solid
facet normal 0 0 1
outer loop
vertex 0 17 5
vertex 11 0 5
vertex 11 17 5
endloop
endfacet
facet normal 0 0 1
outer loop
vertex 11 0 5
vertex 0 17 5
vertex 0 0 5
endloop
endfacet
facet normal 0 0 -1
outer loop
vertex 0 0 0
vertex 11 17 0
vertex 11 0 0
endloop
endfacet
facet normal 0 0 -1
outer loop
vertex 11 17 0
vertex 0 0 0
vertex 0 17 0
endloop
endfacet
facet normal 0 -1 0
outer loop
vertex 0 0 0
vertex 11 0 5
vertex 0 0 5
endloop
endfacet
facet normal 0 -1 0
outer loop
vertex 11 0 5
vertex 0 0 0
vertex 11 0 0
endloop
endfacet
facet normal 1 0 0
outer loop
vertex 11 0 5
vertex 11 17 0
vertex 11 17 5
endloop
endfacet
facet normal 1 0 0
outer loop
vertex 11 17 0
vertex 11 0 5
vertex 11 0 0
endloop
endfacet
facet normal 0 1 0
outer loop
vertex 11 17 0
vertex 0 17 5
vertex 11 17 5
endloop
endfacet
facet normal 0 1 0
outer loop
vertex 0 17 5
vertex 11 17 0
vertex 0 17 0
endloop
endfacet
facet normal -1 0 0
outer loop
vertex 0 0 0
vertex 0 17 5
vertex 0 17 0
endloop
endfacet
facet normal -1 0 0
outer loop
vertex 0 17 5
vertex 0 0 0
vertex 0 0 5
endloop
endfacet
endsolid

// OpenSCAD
// Generated by SolidPython 1.0.1 on 2020-07-29 00:46:55


cube(size = [11, 17, 5]);
/***********************************************
*********      SolidPython code:      **********
************************************************
 
# import packages: SolidPython
from solid import *
from solid.utils import *
from itertools import chain, combinations, permutations


class Resize:

    def __init__(self, scad_file):
        self.scad_file = scad_file
        #self.scad_file = import_scad(scad_file)
        # cone/cylinder param:
        self.r1 = 0
        self.r2 = 0
        self.h = 0
        # rectangular prism param:
        self.w = 0
        self.l = 0
        # ellipse param:
        self.r = 0

    # import OpenScad code (file name corresponds to shape)


    # classify shape + parameters
    def assign(self, param1, param2, param3):
        if self.scad_file == 'cone.scad':
            self.r1 = param1
            self.r2 = param2
            self.h = param3
        elif self.scad_file == 'cylinder.scad':
            self.r1 = param1
            self.r2 = param2
            self.h = param3
        elif self.scad_file == 'rectangularPrism.scad':
            self.h = param1
            self.l = param2
            self.w = param3
        else:
            self.r = param1
            self.h = param2

    # resize parameters
    def iterate(self):
        x = range(3, 20, 2)
        i = 1
        if self.scad_file == 'cone.scad':
            tempList = list(permutations(x, 2))
            for temp in tempList:
                param1 = temp[0]
                param2 = temp[1]
                filepath = 'produced_scad_files/' + 'cone' + str(param1) + '_' + str(param2) + '_' + '.scad'
                scad_render_to_file(cylinder(h=param1, r1=param2, r2=0), filepath)

        elif self.scad_file == 'cylinder.scad':
            tempList = list(permutations(x, 3))
            for temp in tempList:
                param1 = temp[0]
                param2 = temp[1]
                filepath = 'produced_scad_files/' + 'cylinder' + str(param1) + '_' + str(param2) + '_' + '.scad'
                scad_render_to_file(cylinder(h=param1, r1=param2, r2=param2), filepath)

        elif self.scad_file == 'rectangularPrism.scad':
            tempList = list(permutations(x, 3))
            for temp in tempList:
                param1 = temp[0]
                param2 = temp[1]
                param3 = temp[2]
                filepath = 'produced_scad_files/' + 'rectangularPrism' + str(param1) + '_' + str(param2) + '_' + str(
                    param3) + '.scad'
                scad_render_to_file(cube(size=(param1, param2, param3)), filepath)

        elif self.scad_file == 'ellipse.scad':
            tempList = list(permutations(x, 4))
            for temp in tempList:
                param1 = temp[0]
                param2 = temp[1]
                param3 = temp[2]
                param4 = temp[3]
                filepath = 'produced_scad_files/' + 'ellipse' + str(param1) + '_' + str(param2) + '_' + str(param3) + '_' + str(param4) + '.scad'
                scad_render_to_file(scale([param1, param2, param3])(sphere(r=param4)), filepath)

    def render_to_scadfile(self):
        scad_render_to_file(scad, 'example.scad') 
 
************************************************/
